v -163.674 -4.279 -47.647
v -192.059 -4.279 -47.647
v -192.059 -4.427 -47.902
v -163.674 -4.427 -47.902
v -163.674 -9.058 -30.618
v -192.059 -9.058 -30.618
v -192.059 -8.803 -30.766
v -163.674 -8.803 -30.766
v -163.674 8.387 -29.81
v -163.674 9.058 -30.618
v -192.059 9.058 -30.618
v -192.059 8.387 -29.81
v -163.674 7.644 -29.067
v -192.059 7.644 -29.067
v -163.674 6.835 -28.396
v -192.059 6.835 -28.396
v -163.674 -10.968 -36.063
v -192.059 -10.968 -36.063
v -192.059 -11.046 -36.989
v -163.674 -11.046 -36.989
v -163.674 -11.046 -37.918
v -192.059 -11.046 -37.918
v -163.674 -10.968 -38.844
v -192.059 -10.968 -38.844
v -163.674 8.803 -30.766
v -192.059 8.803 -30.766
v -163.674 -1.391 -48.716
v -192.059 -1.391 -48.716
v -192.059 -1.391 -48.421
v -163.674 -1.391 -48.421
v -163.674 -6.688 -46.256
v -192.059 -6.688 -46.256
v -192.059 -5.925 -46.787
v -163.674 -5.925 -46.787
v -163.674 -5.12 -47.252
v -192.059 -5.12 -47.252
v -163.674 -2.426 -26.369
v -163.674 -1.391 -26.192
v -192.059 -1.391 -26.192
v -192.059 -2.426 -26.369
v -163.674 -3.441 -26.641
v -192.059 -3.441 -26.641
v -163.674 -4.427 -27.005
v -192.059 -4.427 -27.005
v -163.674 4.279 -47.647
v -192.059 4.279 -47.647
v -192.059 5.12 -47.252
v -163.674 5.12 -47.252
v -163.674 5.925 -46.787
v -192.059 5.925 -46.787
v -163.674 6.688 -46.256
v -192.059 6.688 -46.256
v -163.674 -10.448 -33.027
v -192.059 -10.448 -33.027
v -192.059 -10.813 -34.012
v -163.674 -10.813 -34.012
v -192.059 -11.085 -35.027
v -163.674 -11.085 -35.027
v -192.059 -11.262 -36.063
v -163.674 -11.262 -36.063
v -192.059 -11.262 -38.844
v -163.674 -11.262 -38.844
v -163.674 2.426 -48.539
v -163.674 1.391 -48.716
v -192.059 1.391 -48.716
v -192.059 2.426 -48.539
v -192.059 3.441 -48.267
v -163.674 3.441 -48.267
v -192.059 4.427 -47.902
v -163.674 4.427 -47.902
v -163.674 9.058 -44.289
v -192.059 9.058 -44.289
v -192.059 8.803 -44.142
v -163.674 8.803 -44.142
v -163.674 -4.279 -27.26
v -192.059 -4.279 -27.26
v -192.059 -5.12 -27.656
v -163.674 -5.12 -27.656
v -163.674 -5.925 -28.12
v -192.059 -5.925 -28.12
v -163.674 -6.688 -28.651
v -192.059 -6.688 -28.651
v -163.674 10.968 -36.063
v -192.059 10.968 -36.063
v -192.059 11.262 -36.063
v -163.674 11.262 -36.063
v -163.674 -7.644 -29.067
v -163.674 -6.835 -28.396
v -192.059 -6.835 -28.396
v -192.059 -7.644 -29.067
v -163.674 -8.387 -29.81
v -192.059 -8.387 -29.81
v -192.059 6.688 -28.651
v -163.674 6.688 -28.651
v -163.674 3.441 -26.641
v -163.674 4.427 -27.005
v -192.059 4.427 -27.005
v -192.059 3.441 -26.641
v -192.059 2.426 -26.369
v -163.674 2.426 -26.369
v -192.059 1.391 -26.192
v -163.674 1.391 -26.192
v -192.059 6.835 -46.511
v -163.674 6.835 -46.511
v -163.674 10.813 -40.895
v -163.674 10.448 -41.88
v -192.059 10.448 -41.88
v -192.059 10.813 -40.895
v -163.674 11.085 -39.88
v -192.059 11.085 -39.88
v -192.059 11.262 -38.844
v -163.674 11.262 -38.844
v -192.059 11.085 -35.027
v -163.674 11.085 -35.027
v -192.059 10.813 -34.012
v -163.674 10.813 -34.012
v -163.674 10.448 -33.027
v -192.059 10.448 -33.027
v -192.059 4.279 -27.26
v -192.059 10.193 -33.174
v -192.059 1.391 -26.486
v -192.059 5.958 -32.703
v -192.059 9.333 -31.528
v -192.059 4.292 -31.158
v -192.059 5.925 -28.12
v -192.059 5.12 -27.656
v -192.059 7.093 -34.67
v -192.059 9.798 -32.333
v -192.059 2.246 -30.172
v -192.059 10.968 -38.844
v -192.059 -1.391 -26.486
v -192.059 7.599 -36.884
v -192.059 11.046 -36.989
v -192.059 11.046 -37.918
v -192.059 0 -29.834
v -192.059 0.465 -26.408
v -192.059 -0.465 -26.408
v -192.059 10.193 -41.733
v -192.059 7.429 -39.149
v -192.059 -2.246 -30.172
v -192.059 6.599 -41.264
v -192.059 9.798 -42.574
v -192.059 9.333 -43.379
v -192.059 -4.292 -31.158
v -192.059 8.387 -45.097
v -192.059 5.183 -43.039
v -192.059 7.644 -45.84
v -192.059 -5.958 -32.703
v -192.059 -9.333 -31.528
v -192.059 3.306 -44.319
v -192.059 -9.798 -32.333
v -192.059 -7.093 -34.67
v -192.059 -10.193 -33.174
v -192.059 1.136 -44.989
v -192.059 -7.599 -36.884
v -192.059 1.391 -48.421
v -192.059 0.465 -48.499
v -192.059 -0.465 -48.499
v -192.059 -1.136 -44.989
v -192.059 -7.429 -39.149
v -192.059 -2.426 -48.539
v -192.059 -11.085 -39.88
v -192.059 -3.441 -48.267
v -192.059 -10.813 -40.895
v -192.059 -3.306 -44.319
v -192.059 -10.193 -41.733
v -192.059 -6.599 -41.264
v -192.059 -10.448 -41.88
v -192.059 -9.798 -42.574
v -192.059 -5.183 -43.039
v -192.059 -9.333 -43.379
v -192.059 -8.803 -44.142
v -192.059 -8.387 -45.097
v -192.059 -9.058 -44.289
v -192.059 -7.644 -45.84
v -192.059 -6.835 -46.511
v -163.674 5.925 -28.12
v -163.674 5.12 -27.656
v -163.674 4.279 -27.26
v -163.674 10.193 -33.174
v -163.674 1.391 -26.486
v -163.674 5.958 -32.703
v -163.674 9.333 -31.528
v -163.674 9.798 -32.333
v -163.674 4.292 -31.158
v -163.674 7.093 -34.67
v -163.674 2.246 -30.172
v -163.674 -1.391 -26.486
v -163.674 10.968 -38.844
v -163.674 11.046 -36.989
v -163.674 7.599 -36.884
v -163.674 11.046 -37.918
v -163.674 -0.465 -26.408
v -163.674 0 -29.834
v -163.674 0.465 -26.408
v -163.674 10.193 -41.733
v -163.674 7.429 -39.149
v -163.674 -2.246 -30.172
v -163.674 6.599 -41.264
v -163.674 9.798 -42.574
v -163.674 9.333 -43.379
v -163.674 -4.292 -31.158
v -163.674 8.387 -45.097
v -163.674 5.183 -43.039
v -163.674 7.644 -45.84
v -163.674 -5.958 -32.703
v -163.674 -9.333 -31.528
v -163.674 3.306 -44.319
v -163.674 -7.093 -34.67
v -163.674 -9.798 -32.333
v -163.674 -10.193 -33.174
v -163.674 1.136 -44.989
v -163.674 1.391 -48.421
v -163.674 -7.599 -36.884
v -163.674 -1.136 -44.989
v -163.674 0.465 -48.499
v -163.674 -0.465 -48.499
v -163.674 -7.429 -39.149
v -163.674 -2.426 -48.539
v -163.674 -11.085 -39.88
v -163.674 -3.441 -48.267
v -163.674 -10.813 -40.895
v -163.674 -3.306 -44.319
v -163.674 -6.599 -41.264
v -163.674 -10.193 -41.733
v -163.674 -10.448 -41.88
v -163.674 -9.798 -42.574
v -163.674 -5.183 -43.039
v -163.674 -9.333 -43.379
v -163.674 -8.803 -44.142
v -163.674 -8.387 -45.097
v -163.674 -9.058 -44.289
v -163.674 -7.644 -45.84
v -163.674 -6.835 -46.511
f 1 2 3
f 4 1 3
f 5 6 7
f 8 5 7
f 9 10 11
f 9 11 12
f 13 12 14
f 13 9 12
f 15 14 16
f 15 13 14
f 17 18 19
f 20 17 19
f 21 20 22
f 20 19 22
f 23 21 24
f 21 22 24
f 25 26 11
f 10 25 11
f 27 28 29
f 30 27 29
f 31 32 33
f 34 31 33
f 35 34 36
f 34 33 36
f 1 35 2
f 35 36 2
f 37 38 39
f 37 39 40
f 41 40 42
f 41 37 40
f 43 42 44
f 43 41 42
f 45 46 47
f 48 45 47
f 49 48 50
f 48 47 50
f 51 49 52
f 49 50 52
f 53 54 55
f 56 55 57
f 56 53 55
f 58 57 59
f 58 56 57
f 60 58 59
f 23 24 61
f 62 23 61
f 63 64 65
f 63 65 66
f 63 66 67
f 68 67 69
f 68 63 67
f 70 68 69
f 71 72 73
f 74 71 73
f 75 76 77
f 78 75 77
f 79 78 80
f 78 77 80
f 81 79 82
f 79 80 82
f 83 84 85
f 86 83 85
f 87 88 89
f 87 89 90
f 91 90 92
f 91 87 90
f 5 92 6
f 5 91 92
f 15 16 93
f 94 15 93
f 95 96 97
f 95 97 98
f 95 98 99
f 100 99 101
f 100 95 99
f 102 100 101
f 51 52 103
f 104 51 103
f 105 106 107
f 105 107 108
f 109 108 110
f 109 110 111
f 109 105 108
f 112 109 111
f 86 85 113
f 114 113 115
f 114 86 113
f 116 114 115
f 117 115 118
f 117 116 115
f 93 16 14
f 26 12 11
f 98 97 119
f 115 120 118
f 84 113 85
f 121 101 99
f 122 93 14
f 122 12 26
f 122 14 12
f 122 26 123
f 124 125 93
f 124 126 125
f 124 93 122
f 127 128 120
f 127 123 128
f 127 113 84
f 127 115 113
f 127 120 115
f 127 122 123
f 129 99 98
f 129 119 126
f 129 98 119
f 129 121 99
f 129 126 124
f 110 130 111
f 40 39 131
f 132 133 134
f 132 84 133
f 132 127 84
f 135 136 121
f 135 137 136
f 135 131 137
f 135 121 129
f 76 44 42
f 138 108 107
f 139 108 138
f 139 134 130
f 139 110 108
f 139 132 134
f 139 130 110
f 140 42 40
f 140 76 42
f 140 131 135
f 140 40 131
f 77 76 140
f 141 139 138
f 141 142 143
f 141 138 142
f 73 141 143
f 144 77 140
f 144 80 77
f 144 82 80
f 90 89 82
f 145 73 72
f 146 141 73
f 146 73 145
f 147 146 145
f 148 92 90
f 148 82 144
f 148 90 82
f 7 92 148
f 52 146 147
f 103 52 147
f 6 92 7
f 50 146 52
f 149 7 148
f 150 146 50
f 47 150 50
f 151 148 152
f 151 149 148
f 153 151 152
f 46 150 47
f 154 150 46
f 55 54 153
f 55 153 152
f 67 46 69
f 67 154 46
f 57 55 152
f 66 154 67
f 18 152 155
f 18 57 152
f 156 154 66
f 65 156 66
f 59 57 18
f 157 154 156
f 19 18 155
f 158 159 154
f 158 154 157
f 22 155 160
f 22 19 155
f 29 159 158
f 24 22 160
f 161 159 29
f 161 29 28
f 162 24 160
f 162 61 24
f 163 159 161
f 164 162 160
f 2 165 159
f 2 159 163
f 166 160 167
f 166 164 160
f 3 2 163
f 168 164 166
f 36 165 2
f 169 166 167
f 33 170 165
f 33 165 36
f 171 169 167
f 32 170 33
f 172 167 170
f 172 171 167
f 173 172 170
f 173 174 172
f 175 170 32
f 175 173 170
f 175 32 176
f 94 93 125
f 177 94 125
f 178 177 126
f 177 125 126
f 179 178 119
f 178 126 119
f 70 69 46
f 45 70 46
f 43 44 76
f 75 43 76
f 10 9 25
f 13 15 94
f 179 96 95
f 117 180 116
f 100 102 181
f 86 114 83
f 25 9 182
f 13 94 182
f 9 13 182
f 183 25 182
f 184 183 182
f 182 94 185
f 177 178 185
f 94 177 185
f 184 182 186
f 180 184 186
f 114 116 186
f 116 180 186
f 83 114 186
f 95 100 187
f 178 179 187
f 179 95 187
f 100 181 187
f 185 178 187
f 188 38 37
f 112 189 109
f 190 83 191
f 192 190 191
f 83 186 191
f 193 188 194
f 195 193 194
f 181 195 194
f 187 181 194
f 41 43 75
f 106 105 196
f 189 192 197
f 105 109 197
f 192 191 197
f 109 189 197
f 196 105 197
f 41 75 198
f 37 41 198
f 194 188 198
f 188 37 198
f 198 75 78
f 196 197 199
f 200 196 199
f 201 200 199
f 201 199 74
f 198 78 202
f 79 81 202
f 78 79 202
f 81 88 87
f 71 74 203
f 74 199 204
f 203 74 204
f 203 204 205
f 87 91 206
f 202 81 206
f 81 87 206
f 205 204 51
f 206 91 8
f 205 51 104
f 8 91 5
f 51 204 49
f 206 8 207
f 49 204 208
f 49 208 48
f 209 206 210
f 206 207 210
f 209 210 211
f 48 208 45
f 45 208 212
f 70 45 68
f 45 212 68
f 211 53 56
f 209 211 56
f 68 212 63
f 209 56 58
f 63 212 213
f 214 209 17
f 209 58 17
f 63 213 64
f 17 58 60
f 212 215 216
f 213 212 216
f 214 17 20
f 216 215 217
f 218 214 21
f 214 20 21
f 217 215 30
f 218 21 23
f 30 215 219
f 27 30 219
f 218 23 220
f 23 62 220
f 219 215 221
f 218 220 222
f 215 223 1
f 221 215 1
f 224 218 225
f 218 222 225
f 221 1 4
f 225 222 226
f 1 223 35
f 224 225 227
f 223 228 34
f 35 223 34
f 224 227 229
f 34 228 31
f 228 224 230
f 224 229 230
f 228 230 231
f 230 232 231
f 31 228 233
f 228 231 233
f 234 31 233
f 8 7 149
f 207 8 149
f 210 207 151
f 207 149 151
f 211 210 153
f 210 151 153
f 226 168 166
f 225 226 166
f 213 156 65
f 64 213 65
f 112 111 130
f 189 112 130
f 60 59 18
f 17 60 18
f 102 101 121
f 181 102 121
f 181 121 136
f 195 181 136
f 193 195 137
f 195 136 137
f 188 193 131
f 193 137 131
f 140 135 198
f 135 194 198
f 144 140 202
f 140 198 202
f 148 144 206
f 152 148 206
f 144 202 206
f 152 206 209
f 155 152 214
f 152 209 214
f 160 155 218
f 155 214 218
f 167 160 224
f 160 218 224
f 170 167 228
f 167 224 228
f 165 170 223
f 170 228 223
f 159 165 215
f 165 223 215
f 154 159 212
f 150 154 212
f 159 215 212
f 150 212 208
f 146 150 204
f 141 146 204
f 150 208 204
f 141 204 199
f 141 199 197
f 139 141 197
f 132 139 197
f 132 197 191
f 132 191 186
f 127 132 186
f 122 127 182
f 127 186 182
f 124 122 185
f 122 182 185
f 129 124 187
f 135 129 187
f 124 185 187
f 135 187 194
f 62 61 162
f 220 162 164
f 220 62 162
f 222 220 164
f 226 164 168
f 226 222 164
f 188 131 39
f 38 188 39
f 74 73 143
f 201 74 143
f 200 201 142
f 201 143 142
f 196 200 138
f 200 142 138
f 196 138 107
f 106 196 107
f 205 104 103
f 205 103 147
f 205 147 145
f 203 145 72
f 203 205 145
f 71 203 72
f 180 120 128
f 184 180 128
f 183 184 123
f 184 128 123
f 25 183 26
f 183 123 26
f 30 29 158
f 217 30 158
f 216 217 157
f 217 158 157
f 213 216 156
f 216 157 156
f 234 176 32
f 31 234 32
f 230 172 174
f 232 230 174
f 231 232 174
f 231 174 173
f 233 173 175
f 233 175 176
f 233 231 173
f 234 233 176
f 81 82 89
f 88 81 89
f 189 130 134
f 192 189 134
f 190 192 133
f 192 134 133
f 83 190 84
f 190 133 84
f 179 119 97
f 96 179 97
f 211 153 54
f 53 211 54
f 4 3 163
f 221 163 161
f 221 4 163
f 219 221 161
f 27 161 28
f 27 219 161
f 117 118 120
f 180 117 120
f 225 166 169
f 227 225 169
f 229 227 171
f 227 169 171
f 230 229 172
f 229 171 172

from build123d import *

# Parameters (mm, degrees)
F0_W     = 28.3845
F0_H     = 3.72745
F3_DEPTH = 28.3855
F4_COUNT = 12


with BuildPart() as f1:
    # F0 (on Front) → F1 (revolve)
    with BuildSketch(Plane.XZ):
        with Locations((-177.8664920464, -27.9698891753)):
            Rectangle(F0_W, F0_H)
    revolve(axis=Axis((-177.8664920464, 0, -37.4536141753), (1, 0, 0)))

    # F2 (on face) → F3 (cut, through all)
    with BuildSketch(Plane(origin=(-192.0587420464, 0, 0), x_dir=(0, -1, 0), z_dir=(-1, 0, 0))):
        with BuildLine():
            Line((1.39065, -26.4860777063), (1.39065, -26.1916998585))
            ThreePointArc((1.39065, -26.1916998585), (0, -26.1061641753), (-1.39065, -26.1916998585))
            Line((-1.39065, -26.1916998585), (-1.39065, -26.4860777063))
            ThreePointArc((-1.39065, -26.4860777063), (0, -26.3982641753), (1.39065, -26.4860777063))
        make_face()
    f3 = extrude(amount=-F3_DEPTH, mode=Mode.SUBTRACT)

    # F4: F3 ×12 about axis
    f4_axis = Axis((-163.6742420464, 0, -37.4536141753), (-1, 0, 0))
    for i in range(1, F4_COUNT):
        add(f3.rotate(f4_axis, i * 360 / F4_COUNT), mode=Mode.SUBTRACT)


solid = f1.part
